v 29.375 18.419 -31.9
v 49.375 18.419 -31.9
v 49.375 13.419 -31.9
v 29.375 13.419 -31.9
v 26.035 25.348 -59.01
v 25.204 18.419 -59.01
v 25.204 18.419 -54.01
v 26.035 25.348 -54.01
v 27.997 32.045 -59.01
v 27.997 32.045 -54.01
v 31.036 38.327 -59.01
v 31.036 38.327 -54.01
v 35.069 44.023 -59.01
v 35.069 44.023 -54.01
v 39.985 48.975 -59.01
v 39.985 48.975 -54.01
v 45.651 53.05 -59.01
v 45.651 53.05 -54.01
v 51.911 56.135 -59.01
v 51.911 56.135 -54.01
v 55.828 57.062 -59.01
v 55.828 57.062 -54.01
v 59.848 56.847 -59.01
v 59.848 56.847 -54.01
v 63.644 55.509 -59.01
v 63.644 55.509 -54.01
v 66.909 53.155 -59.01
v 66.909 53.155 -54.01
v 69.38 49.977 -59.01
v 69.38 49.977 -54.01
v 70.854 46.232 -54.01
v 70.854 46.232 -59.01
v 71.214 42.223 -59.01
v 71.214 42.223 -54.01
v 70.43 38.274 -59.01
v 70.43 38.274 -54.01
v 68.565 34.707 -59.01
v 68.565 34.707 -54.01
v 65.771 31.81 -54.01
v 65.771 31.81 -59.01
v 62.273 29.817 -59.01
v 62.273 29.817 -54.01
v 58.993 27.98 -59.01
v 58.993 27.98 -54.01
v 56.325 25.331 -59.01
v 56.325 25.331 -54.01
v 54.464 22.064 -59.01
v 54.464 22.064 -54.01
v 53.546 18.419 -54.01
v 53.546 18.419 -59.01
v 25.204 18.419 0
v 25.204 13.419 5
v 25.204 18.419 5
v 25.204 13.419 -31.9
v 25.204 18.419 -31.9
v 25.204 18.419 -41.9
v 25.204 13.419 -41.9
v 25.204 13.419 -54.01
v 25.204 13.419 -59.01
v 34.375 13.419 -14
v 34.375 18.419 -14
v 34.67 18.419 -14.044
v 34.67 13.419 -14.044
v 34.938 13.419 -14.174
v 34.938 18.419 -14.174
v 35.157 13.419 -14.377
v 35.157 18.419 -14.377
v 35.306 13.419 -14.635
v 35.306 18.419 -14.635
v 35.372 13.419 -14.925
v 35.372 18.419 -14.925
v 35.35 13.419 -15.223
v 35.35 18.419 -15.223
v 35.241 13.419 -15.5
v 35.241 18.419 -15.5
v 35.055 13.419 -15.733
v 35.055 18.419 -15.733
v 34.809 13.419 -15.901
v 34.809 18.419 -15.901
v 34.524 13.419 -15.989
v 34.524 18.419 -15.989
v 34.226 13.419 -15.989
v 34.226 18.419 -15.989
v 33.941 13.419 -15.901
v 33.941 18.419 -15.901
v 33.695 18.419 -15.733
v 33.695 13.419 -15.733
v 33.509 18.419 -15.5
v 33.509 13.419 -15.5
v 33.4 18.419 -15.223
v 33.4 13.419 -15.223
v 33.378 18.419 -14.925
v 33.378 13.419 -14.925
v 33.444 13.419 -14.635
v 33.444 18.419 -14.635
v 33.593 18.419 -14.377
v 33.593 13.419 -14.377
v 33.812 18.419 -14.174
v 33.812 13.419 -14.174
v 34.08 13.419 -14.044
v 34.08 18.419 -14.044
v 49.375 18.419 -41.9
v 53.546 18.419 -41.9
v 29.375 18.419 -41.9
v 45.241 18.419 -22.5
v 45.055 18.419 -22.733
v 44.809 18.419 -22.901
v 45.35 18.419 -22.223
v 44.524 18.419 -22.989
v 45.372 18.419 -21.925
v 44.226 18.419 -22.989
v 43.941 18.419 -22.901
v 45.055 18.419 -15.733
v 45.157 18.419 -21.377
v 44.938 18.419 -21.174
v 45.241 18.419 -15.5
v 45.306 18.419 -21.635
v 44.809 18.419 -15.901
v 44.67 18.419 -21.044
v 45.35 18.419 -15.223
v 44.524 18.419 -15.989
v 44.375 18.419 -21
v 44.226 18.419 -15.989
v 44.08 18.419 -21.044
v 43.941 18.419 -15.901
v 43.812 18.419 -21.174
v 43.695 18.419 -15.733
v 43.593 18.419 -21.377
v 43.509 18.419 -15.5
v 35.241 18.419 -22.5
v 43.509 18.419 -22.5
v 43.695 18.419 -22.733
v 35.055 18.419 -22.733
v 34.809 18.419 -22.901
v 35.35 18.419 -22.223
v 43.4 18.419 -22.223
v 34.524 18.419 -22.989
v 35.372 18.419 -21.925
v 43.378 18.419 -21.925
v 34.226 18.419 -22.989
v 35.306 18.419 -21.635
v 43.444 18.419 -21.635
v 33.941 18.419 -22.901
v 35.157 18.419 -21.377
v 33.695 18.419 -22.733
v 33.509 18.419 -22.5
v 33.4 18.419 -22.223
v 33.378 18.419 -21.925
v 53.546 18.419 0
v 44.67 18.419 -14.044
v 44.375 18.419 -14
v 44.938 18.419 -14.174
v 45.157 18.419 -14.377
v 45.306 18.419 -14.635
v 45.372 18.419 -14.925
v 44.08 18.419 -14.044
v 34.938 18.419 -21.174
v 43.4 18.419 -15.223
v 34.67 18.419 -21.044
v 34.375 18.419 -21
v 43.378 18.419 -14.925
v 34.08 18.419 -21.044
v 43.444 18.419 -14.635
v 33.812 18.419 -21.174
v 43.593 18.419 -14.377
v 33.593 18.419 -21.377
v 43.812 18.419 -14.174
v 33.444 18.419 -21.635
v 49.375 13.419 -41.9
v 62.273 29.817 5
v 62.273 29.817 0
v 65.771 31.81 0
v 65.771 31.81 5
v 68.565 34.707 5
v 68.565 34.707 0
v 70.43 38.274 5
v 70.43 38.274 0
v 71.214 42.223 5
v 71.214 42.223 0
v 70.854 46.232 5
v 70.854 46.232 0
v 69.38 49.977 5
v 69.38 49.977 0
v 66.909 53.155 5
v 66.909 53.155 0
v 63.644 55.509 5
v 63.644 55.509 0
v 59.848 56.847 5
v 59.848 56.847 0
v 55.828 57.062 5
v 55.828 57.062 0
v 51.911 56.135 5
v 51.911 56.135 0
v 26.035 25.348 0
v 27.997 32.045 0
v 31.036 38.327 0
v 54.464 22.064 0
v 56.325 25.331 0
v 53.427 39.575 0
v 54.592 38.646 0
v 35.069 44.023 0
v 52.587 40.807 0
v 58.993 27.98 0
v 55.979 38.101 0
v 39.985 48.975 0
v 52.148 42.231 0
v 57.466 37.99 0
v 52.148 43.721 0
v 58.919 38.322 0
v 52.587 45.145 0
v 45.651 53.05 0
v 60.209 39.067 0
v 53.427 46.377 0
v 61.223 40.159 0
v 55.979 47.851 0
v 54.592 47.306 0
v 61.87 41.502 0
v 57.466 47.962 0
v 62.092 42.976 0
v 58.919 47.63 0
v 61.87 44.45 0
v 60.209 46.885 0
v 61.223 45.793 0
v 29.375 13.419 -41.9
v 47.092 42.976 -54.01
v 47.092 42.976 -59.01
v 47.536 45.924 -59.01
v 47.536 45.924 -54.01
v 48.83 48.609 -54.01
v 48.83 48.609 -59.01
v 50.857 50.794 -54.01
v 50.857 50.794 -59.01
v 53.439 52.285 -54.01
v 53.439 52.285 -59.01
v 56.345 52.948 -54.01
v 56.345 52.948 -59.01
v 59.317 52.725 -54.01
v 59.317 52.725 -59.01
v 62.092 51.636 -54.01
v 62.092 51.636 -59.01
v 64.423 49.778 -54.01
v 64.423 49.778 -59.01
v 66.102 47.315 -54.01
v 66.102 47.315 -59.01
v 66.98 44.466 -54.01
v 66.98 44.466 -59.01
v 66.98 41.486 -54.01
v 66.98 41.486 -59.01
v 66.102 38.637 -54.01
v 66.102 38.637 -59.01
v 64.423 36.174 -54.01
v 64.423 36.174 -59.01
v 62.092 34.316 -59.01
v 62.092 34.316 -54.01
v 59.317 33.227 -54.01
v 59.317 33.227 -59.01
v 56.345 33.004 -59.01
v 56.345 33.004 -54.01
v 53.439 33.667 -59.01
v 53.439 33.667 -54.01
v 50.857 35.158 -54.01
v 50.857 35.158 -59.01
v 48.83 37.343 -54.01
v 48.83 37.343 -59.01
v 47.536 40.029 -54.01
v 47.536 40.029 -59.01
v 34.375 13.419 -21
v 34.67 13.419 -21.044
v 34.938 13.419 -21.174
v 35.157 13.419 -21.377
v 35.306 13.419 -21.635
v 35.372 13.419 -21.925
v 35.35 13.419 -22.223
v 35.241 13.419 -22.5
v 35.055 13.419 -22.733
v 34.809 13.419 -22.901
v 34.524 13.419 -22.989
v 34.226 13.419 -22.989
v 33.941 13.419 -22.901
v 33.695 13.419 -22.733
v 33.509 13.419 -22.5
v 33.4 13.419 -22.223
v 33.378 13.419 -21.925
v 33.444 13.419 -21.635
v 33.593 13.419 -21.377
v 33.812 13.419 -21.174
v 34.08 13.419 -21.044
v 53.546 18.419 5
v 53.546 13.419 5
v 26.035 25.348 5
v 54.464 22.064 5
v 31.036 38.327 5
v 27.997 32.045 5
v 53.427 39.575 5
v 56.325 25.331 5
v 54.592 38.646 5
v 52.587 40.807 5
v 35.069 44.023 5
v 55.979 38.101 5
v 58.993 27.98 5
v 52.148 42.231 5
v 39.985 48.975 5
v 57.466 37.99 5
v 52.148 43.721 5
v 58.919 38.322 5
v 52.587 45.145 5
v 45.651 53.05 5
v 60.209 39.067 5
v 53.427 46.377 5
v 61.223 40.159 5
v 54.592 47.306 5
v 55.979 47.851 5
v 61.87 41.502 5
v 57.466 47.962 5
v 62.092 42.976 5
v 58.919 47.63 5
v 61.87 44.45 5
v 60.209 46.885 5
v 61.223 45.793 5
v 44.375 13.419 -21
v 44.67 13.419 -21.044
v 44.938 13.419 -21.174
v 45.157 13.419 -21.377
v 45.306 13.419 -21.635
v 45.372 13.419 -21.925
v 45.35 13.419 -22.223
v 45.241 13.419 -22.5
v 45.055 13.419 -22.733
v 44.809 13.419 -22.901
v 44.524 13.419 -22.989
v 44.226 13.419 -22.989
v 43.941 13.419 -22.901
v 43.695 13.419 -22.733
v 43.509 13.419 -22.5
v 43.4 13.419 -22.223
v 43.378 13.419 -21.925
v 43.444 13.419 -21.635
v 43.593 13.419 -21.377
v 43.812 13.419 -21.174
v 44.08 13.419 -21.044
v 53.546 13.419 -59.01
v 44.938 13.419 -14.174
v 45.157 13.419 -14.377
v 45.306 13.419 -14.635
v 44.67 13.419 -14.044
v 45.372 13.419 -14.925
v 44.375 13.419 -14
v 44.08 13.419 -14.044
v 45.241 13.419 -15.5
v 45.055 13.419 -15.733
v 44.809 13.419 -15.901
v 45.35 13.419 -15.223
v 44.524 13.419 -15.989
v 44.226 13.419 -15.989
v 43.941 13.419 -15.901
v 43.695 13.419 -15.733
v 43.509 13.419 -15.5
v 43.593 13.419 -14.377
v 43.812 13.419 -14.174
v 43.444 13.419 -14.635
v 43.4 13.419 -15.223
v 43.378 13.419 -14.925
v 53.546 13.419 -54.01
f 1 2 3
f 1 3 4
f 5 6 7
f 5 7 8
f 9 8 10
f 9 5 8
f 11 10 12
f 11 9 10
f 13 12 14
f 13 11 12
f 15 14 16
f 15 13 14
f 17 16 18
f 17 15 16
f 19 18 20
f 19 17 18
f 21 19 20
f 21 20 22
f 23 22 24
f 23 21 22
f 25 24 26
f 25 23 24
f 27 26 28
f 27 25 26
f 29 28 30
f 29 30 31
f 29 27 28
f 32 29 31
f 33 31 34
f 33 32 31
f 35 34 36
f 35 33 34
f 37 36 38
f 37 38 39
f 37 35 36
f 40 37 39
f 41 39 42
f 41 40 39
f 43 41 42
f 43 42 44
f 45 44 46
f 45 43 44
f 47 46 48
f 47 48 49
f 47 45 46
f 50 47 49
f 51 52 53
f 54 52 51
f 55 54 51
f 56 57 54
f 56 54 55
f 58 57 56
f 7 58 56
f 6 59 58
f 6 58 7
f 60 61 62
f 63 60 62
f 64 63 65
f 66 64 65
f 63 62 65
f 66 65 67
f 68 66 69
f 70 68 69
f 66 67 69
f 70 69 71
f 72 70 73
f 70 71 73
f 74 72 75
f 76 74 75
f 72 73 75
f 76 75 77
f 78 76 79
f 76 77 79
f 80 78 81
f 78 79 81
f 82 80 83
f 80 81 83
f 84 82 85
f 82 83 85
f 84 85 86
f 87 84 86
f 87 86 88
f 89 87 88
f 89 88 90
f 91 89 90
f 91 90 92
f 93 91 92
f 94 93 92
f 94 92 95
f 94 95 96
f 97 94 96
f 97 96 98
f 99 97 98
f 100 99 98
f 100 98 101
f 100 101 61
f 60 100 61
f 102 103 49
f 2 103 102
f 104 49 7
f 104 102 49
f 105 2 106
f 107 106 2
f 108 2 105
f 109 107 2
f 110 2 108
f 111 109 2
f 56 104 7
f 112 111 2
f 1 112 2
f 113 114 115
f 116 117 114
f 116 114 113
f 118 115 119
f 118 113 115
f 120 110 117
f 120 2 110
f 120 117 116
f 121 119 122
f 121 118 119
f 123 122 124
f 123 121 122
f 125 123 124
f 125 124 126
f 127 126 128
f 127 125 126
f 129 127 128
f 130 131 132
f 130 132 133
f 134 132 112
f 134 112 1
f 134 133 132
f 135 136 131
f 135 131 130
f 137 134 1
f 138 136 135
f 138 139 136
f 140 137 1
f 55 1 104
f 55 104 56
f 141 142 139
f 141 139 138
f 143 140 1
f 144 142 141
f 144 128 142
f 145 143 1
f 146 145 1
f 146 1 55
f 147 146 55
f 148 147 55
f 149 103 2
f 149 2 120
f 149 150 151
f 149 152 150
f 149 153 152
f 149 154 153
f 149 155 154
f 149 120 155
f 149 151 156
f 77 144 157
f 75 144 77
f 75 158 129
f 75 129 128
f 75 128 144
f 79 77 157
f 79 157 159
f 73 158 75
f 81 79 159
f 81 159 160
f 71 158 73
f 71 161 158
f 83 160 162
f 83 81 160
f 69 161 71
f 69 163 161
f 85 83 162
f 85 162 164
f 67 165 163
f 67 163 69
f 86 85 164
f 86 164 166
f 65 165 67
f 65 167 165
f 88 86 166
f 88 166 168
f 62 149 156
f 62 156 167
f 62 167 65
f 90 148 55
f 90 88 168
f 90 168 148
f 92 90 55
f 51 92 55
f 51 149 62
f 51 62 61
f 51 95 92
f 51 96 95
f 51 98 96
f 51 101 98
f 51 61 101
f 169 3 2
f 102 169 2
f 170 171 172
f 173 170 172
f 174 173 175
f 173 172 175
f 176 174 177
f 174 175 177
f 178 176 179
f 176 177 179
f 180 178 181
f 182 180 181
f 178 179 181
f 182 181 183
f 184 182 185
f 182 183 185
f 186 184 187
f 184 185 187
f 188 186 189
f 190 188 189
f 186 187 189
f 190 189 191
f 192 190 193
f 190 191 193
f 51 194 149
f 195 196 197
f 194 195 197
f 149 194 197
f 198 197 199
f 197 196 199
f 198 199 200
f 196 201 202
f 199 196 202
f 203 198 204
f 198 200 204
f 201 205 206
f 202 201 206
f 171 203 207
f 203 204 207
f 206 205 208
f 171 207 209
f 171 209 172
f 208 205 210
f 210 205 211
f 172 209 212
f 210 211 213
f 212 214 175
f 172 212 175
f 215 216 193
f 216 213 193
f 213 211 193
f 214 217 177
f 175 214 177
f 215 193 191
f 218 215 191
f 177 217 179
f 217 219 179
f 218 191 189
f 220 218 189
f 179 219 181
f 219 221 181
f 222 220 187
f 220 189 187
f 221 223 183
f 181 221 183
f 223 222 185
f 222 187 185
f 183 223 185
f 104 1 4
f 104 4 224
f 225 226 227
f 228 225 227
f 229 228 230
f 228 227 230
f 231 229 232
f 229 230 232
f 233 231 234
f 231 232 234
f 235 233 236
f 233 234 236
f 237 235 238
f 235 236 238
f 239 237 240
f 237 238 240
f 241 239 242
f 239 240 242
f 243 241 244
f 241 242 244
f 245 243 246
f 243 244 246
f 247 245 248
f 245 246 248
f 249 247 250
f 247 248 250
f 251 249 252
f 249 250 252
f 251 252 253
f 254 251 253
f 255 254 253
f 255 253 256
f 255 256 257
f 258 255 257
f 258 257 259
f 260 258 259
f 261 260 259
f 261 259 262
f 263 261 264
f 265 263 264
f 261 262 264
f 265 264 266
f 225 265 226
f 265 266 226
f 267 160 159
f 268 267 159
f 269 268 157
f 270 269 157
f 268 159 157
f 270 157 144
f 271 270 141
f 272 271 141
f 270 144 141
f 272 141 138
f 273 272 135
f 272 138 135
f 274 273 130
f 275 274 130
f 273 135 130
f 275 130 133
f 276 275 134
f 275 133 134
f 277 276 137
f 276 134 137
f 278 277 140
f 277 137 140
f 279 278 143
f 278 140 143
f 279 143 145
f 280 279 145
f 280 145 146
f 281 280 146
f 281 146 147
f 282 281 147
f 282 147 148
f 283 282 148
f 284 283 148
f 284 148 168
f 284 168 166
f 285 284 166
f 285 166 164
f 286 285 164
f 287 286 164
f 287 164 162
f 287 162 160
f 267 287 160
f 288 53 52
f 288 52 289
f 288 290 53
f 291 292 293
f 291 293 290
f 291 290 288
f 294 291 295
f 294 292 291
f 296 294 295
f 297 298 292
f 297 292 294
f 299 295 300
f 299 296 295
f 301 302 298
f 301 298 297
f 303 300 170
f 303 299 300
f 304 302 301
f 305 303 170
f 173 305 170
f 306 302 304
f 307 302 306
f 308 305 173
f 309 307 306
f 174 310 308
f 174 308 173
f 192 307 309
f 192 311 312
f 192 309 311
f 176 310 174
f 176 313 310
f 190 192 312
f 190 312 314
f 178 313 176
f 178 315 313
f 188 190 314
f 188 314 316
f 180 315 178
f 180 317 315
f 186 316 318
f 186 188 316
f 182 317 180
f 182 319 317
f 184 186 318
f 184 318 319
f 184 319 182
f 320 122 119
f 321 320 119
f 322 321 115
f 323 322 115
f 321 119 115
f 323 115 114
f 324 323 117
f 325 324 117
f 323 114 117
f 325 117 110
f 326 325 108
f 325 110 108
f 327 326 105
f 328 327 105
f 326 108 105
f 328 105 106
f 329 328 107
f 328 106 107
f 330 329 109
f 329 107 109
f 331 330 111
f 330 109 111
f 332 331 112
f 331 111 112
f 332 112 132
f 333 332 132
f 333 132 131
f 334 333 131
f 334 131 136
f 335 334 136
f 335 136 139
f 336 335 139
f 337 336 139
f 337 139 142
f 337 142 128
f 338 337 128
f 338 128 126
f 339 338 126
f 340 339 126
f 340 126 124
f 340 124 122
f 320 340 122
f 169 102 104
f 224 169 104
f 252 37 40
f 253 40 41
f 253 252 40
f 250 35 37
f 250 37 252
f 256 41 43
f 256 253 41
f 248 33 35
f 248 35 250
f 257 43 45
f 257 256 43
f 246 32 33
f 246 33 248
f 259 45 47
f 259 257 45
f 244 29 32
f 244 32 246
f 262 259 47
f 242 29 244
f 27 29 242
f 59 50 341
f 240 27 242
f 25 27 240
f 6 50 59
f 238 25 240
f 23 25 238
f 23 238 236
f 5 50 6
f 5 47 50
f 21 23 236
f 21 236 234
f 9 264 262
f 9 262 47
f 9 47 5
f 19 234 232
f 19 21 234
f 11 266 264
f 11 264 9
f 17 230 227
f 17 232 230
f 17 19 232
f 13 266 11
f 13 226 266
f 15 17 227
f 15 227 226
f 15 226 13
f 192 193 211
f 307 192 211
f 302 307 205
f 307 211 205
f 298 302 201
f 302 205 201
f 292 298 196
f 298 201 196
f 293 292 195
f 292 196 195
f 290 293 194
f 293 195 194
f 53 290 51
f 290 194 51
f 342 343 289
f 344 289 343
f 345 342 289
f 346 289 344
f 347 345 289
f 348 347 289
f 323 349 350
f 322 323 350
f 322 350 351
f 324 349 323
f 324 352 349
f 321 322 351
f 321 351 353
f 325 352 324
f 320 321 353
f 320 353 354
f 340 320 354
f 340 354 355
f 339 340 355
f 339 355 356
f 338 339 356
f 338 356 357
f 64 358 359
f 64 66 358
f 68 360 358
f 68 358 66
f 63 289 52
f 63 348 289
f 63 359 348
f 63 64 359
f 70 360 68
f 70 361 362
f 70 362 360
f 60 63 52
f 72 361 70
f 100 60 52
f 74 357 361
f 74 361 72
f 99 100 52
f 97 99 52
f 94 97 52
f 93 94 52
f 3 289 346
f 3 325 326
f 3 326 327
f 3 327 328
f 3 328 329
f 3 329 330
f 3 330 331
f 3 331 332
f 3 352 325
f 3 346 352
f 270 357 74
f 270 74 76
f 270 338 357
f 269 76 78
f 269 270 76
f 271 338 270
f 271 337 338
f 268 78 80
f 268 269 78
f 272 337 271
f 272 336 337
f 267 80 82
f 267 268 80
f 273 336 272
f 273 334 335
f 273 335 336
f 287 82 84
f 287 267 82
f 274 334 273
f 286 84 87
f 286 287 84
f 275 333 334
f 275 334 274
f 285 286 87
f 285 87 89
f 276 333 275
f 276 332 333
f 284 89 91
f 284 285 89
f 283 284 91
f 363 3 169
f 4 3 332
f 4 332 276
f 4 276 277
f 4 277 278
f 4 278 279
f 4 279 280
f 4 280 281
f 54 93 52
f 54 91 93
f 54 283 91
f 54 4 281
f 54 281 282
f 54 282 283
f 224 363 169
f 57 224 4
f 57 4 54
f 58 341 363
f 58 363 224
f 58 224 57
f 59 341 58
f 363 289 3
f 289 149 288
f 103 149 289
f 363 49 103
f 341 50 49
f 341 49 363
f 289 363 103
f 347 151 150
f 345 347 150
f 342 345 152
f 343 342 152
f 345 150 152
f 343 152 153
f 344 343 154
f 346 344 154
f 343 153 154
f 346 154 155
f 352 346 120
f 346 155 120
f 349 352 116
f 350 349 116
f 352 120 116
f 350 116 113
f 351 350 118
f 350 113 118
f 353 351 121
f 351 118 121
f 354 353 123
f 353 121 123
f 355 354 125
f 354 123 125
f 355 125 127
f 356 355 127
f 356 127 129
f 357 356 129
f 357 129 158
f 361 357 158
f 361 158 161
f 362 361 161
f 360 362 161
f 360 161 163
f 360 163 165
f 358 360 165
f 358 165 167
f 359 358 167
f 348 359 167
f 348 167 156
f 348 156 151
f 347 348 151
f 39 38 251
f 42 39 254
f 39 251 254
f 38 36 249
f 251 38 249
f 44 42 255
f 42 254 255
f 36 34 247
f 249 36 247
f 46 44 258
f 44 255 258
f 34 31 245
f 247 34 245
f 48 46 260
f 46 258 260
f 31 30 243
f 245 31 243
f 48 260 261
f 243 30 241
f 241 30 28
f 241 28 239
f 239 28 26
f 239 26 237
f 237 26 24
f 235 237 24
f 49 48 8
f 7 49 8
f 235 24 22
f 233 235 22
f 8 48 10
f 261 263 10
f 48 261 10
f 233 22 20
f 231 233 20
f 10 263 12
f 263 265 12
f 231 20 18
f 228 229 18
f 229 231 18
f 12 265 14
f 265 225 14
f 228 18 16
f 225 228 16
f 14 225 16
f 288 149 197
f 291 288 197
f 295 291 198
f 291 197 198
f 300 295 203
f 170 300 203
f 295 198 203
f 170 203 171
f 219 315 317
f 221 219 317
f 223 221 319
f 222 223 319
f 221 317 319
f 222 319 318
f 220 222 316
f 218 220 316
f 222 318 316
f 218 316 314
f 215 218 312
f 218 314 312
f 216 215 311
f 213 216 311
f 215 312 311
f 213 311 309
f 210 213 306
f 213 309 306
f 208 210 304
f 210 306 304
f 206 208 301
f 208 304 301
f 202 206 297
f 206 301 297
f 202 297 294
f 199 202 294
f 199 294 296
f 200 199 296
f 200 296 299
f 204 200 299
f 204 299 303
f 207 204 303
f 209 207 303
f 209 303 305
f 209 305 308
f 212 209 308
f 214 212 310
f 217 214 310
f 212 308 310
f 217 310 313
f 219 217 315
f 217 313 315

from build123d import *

# Parameters (mm, degrees)
BOSS_EXTRUDE1_DEPTH  = 5
SKETCH2_R            = 5
CUT_EXTRUDE1_DEPTH   = 5
SKETCH4_W            = 28.341926147
SKETCH4_H            = 5
BOSS_EXTRUDE2_DEPTH  = 5
SKETCH5_W            = 28.341926147
SKETCH5_H            = 5
BOSS_EXTRUDE3_DEPTH  = 31.9
SKETCH6_W            = 20
SKETCH6_H            = 5
CUT_EXTRUDE3_DEPTH   = 5
SKETCH8_W            = 4.170963073
SKETCH8_H            = 5
SKETCH8_W_2          = 4.170963074
BOSS_EXTRUDE8_DEPTH  = 10
SKETCH15_W           = 20
SKETCH15_H           = 5
BOSS_EXTRUDE9_DEPTH  = 5
SKETCH18_W           = 28.341926147
SKETCH18_H           = 5
BOSS_EXTRUDE11_DEPTH = 12.11
SKETCH19_R           = 1
CUT_EXTRUDE6_DEPTH   = 12.11
BOSS_EXTRUDE12_START = 5
SKETCH20_R           = 10
BOSS_EXTRUDE12_DEPTH = 5


with BuildPart() as part:
    # Model → Boss-Extrude1 (new body)
    with BuildSketch(Plane.XY):
        with BuildLine():
            Line((25.203972036, 18.418809181), (53.545898183, 18.418809181))
            ThreePointArc((53.545898183, 18.418809181), (56.325296764, 25.33096224), (62.273132312, 29.817182103))
            ThreePointArc((62.273132312, 29.817182103), (70.250885109, 48.157178295), (51.910888918, 56.134931092))
            ThreePointArc((51.910888918, 56.134931092), (32.934484586, 41.258497646), (25.203972036, 18.418809181))
        make_face()
    extrude(amount=BOSS_EXTRUDE1_DEPTH)

    # Sketch2 → Cut-Extrude1 (cut)
    with BuildSketch(Plane.XY.offset(5)):
        with Locations((57.092010615, 42.976056598)):
            Circle(SKETCH2_R)
    extrude(amount=-CUT_EXTRUDE1_DEPTH, mode=Mode.SUBTRACT)

    # Sketch4 → Boss-Extrude2 (add)
    with BuildSketch(Plane.XZ.offset(-18.418809181)):
        with Locations((39.37493511, 2.5)):
            Rectangle(SKETCH4_W, SKETCH4_H)
    extrude(amount=BOSS_EXTRUDE2_DEPTH)

    # Sketch5 → Boss-Extrude3 (add)
    with BuildSketch(Plane(origin=(0, 0, 0), x_dir=(-1, 0, 0), z_dir=(0, 0, -1))):
        with Locations((-39.37493511, 15.918809181)):
            Rectangle(SKETCH5_W, SKETCH5_H)
    extrude(amount=BOSS_EXTRUDE3_DEPTH)

    # Sketch6 → Cut-Extrude3 (cut)
    with BuildSketch(Plane(origin=(0, 18.418809181, 0), x_dir=(1, 0, 0), z_dir=(0, 1, 0))):
        with Locations((39.37493511, 29.4)):
            Rectangle(SKETCH6_W, SKETCH6_H)
    extrude(amount=-CUT_EXTRUDE3_DEPTH, mode=Mode.SUBTRACT)

    # Sketch8 → Boss-Extrude8 (add)
    with BuildSketch(Plane(origin=(0, 0, -31.9), x_dir=(-1, 0, 0), z_dir=(0, 0, -1))):
        with Locations((-51.460416647, 15.918809181)):
            Rectangle(SKETCH8_W, SKETCH8_H)
        with Locations((-27.289453573, 15.918809181)):
            Rectangle(SKETCH8_W_2, SKETCH8_H)
    extrude(amount=BOSS_EXTRUDE8_DEPTH)

    # Sketch15 → Boss-Extrude9 (add)
    with BuildSketch(Plane(origin=(0, 0, -26.9), x_dir=(-1, 0, 0), z_dir=(0, 0, -1))):
        with Locations((-39.37493511, 15.918809181)):
            Rectangle(SKETCH15_W, SKETCH15_H)
    extrude(amount=BOSS_EXTRUDE9_DEPTH)

    # Sketch18 → Boss-Extrude11 (add)
    with BuildSketch(Plane(origin=(0, 0, -41.9), x_dir=(-1, 0, 0), z_dir=(0, 0, -1))):
        with Locations((-39.37493511, 15.918809181)):
            Rectangle(SKETCH18_W, SKETCH18_H)
    extrude(amount=BOSS_EXTRUDE11_DEPTH)

    # Sketch19 → Cut-Extrude6 (cut)
    with BuildSketch(Plane(origin=(0, 18.418809181, 0), x_dir=(1, 0, 0), z_dir=(0, 1, 0))):
        with Locations(Location((34.37493511, 22, 0), (0, 0, 270))):
            Circle(SKETCH19_R)
        with Locations(Location((44.37493511, 22, 0), (0, 0, 270))):
            Circle(SKETCH19_R)
        with Locations(Location((34.37493511, 15, 0), (0, 0, 270))):
            Circle(SKETCH19_R)
        with Locations(Location((44.37493511, 15, 0), (0, 0, 270))):
            Circle(SKETCH19_R)
    extrude(amount=-CUT_EXTRUDE6_DEPTH, mode=Mode.SUBTRACT)

    # Sketch20 → Boss-Extrude12 (add)
    with BuildSketch(Plane(origin=(0, 0, -54.01), x_dir=(-1, 0, 0), z_dir=(0, 0, -1)).offset(BOSS_EXTRUDE12_START)):
        with BuildLine():
            Line((-53.545898183, 18.418809181), (-53.545898183, 13.418809181))
            Line((-53.545898183, 13.418809181), (-25.203972036, 13.418809181))
            Line((-25.203972036, 13.418809181), (-25.203972036, 18.418809181))
            ThreePointArc((-25.203972036, 18.418809181), (-32.934484586, 41.258497646), (-51.910888918, 56.134931092))
            ThreePointArc((-51.910888918, 56.134931092), (-70.250885109, 48.157178295), (-62.273132312, 29.817182103))
            ThreePointArc((-62.273132312, 29.817182103), (-56.325296764, 25.33096224), (-53.545898183, 18.418809181))
        make_face()
        with Locations((-57.092010615, 42.976056598)):
            Circle(SKETCH20_R, mode=Mode.SUBTRACT)
    extrude(amount=-BOSS_EXTRUDE12_DEPTH)


solid = part.part
